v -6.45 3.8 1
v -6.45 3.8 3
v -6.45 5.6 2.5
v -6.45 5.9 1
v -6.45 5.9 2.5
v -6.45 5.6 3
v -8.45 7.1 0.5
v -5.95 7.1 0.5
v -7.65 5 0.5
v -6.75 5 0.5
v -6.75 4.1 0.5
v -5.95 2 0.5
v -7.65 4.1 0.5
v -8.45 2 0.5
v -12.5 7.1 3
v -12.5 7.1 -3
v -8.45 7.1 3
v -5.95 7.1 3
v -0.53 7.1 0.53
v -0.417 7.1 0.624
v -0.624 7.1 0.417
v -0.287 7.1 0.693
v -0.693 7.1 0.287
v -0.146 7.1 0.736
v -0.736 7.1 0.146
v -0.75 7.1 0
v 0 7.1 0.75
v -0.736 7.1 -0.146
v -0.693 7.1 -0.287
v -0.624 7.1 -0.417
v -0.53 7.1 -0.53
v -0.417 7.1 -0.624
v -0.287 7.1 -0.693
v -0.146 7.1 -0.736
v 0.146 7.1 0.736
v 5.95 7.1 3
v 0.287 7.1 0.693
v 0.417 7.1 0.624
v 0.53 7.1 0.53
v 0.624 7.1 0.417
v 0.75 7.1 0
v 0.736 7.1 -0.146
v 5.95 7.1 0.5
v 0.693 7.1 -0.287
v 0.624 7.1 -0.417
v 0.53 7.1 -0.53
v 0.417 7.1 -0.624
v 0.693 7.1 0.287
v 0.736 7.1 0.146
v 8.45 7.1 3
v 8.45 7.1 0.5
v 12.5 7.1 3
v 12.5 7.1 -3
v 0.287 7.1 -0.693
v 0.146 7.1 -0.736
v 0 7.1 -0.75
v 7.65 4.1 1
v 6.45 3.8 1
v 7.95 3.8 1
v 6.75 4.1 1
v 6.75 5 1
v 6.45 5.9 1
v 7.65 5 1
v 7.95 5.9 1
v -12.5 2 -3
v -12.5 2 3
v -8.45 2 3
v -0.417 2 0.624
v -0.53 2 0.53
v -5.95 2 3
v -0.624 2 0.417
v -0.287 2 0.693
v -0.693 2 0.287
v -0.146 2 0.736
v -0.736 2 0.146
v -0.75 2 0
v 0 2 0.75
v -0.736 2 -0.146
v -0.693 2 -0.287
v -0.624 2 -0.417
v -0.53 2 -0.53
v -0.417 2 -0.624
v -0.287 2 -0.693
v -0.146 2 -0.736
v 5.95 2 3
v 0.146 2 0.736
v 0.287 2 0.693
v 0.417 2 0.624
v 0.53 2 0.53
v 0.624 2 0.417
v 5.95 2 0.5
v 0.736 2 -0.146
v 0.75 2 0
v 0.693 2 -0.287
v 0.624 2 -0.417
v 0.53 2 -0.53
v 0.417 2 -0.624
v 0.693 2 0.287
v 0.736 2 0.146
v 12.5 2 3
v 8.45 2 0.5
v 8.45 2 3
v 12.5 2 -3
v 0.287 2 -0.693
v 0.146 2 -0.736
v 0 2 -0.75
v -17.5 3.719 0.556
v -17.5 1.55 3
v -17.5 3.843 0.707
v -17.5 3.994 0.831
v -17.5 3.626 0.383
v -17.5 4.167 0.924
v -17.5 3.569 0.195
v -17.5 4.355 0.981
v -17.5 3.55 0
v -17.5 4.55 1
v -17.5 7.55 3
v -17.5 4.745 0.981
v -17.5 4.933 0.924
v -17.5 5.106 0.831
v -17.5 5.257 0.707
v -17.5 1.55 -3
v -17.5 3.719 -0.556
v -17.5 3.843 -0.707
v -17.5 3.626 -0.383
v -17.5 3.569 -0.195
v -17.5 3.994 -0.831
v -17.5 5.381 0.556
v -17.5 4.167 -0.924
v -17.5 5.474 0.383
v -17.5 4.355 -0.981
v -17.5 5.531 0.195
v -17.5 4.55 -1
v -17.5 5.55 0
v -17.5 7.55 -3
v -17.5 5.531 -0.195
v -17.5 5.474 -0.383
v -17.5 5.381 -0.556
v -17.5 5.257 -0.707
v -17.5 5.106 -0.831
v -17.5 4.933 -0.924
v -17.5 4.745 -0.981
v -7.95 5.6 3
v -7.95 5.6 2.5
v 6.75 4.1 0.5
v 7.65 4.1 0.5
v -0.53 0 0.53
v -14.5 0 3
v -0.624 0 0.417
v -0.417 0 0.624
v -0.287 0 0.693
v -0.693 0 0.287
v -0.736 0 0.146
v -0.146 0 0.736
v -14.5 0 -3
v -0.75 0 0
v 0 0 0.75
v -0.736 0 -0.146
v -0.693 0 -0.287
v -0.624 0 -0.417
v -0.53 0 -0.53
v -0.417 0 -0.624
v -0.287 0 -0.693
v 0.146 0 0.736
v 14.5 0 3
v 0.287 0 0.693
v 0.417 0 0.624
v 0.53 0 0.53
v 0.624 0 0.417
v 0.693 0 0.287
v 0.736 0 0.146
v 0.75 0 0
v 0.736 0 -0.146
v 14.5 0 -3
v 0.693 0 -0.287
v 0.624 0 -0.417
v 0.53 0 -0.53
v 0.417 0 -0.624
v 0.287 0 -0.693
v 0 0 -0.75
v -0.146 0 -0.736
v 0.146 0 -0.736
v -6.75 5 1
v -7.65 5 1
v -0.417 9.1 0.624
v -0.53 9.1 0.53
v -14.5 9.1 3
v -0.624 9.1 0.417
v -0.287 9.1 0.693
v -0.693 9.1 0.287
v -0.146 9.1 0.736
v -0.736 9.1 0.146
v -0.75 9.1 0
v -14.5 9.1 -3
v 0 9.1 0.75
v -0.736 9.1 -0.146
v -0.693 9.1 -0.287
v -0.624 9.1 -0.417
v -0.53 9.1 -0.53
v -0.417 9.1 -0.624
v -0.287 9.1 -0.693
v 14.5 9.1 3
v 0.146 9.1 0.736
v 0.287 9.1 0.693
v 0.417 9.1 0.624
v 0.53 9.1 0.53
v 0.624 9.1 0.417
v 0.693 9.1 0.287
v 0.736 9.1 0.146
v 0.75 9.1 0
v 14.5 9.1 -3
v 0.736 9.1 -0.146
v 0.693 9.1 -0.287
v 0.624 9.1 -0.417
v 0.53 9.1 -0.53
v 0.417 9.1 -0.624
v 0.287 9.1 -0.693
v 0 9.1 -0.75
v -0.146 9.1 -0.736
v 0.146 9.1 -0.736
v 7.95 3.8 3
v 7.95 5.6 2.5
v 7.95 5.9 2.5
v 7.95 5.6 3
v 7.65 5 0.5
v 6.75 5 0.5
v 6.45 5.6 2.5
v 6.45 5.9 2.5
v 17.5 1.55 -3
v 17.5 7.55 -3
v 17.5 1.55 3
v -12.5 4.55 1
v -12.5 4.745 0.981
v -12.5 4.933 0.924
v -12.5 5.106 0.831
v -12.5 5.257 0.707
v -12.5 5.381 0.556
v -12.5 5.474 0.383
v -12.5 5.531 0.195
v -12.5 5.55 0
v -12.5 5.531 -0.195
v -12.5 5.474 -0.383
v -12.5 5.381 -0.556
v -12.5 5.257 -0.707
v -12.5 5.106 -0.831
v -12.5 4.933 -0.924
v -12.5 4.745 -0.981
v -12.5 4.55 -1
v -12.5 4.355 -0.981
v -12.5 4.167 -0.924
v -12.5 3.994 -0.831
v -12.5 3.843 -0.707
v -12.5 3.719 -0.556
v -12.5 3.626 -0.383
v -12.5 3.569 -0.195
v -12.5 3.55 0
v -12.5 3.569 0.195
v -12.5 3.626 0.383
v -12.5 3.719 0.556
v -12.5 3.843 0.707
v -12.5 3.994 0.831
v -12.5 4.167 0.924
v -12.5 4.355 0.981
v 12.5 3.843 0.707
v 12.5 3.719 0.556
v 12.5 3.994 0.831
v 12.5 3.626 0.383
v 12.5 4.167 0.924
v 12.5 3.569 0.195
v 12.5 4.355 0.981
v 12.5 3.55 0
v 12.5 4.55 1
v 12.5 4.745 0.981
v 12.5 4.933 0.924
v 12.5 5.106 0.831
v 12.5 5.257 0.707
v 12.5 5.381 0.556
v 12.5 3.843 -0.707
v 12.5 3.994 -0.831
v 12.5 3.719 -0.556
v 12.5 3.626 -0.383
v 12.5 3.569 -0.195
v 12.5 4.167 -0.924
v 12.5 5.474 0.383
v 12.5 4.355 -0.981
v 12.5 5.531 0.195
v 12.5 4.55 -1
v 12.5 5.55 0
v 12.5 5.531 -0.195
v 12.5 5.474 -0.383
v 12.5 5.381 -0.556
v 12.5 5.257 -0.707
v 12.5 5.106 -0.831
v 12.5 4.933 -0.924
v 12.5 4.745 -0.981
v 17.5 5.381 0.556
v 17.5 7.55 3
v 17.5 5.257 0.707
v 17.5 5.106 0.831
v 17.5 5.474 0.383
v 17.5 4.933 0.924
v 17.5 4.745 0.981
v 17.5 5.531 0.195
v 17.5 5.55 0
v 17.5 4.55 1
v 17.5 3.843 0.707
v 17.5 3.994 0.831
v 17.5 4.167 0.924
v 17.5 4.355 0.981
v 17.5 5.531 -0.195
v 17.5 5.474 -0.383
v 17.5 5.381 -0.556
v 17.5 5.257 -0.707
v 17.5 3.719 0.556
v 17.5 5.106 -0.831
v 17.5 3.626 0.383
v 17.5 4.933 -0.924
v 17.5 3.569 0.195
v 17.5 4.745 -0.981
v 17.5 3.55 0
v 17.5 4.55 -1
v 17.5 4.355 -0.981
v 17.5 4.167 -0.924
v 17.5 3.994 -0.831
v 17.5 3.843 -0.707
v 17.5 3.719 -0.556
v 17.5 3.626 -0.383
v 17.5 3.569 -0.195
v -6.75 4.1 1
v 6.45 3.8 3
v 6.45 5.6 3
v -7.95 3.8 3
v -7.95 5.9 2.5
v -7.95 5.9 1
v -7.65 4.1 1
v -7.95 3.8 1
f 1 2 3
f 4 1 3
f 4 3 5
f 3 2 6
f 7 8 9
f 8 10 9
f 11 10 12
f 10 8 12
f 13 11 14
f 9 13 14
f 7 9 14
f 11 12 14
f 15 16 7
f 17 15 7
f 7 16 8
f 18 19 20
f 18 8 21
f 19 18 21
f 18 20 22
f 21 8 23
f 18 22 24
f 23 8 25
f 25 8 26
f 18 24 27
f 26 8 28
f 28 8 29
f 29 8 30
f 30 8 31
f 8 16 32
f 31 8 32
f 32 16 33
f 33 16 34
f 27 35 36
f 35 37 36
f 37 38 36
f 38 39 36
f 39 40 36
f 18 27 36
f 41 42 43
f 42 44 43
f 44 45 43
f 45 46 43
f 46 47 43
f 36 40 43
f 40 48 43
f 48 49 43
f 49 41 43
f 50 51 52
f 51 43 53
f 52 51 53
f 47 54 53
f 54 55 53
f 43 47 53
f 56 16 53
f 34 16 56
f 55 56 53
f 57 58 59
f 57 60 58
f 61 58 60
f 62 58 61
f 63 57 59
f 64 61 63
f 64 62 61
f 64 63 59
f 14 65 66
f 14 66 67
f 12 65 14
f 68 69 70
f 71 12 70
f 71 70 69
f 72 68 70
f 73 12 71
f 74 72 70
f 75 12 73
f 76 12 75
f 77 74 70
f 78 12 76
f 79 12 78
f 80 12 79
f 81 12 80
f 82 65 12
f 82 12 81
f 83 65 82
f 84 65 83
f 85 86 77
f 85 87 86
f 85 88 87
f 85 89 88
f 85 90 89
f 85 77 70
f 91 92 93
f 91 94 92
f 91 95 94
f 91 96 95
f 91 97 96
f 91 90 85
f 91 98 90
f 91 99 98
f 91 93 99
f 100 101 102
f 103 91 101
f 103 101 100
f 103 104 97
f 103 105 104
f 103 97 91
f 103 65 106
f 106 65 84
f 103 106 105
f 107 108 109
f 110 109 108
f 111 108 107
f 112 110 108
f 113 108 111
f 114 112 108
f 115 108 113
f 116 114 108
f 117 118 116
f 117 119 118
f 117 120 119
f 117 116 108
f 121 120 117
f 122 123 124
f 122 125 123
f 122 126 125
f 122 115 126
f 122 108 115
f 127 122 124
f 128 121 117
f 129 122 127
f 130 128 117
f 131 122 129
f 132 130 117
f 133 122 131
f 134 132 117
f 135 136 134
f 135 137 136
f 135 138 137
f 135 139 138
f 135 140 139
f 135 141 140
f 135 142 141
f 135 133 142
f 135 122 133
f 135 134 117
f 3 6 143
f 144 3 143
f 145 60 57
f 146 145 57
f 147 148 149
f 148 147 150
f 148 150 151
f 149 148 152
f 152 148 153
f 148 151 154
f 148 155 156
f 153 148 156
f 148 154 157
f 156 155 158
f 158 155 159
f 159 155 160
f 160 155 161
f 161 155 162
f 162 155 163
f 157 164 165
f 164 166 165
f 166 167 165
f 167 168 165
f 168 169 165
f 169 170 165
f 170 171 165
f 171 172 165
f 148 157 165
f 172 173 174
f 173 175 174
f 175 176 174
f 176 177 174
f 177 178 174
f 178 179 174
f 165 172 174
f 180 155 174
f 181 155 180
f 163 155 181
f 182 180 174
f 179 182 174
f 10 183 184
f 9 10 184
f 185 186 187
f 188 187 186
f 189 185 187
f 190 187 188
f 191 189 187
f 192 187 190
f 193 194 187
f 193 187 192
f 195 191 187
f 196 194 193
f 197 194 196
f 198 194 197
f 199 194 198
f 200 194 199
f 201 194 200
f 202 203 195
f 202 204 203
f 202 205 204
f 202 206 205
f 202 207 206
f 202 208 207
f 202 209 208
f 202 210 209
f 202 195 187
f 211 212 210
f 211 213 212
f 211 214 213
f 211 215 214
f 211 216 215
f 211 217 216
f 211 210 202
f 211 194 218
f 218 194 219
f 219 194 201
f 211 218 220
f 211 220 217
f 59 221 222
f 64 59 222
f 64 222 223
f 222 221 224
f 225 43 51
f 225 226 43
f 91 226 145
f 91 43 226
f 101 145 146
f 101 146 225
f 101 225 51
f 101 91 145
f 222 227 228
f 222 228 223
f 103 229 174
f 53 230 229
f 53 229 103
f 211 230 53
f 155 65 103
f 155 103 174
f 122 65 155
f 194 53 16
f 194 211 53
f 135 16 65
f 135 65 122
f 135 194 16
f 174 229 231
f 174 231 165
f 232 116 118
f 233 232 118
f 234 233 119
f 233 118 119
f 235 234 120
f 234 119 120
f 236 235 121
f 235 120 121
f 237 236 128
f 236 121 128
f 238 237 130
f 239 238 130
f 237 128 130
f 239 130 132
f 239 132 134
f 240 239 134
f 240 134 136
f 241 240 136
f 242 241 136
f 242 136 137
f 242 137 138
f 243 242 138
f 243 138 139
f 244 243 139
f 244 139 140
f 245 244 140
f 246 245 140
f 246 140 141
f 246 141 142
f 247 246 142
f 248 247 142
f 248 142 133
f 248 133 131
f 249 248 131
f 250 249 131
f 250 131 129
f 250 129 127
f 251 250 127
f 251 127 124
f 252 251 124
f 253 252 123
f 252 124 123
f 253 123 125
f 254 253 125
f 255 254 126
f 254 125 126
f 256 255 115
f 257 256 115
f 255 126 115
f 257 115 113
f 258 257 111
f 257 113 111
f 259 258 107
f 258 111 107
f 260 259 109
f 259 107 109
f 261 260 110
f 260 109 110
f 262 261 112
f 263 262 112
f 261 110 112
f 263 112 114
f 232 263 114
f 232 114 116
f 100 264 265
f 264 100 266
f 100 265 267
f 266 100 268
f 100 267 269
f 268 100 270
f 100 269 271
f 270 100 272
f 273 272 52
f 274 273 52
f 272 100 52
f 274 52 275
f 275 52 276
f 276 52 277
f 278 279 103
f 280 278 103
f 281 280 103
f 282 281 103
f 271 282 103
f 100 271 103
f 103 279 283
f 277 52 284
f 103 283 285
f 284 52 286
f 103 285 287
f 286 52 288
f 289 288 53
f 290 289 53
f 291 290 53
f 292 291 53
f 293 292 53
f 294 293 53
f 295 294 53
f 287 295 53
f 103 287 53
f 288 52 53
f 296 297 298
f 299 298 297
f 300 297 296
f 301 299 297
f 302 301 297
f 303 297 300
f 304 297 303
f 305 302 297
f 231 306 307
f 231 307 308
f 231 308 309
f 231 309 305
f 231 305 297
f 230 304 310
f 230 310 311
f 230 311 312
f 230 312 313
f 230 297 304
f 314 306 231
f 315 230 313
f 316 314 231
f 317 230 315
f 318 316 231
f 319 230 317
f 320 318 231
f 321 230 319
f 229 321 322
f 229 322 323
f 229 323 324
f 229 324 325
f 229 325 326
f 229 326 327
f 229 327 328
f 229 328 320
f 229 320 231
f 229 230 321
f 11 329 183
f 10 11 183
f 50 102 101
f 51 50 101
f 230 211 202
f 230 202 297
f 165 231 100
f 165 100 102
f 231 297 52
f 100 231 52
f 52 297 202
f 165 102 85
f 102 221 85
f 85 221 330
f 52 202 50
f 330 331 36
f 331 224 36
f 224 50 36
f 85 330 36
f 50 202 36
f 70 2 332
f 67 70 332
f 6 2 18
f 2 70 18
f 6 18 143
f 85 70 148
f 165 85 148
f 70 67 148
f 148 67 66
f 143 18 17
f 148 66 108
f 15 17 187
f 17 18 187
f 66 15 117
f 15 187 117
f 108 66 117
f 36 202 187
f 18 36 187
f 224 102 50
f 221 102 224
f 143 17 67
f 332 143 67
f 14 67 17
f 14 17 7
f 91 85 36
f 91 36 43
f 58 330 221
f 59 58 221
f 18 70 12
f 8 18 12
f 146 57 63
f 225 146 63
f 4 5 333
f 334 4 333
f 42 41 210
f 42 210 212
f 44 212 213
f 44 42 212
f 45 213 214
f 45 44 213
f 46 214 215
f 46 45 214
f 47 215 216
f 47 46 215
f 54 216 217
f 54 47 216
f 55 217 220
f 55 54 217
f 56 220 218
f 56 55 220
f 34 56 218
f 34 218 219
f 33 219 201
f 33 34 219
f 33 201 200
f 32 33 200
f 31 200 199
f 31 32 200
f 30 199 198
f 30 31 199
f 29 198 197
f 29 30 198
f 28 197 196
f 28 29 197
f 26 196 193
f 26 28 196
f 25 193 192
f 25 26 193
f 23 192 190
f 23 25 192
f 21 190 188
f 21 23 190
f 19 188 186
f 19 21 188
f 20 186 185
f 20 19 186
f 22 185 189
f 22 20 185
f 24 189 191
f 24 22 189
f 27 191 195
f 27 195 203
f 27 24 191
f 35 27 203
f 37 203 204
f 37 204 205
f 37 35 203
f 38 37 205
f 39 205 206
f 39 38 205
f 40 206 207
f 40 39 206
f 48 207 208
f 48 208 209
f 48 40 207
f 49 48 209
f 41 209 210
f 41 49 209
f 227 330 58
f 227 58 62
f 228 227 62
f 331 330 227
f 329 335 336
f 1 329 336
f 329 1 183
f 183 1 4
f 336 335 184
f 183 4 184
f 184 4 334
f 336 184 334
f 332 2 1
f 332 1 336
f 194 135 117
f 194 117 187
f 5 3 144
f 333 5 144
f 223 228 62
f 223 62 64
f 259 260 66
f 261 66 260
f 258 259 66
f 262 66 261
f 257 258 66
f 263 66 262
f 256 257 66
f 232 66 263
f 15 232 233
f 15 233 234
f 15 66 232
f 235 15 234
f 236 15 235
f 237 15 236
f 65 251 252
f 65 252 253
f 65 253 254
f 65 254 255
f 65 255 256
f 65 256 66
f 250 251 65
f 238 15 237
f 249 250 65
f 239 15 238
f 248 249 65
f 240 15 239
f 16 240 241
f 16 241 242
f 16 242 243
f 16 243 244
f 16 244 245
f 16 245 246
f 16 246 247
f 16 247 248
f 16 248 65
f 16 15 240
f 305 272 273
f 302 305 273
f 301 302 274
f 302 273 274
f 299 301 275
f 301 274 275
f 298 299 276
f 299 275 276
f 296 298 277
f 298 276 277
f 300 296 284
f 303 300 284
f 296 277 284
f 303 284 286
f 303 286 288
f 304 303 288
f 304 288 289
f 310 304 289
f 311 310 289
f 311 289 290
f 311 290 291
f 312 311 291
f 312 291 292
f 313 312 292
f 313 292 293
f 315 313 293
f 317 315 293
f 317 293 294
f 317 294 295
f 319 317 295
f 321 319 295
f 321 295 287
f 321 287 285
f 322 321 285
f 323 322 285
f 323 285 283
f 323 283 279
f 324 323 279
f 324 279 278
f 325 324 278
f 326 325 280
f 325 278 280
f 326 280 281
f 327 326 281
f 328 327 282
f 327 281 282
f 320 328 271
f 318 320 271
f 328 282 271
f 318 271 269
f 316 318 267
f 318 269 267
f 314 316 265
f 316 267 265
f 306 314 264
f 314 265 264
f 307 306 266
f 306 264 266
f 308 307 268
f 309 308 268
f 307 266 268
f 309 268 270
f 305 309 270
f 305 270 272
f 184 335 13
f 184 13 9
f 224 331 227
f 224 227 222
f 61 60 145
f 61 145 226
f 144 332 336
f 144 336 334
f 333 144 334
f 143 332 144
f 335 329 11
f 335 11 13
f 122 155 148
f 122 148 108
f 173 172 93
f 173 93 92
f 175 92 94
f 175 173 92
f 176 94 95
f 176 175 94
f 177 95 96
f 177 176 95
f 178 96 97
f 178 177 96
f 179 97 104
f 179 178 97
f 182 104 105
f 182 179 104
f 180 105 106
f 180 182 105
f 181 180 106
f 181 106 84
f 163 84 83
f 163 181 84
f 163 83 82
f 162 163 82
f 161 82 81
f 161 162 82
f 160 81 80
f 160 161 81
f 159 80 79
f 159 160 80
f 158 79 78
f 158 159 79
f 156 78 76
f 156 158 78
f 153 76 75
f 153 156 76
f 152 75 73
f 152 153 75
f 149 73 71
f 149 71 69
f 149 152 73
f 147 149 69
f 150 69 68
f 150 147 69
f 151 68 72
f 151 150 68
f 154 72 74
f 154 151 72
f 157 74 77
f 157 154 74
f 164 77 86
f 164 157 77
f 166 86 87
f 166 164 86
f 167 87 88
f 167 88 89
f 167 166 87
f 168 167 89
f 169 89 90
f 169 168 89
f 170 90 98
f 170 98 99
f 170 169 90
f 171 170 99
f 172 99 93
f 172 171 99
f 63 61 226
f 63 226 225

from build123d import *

# Parameters (mm, degrees)
SKETCH1_W                  = 25
SKETCH1_H                  = 6
SKETCH1_R                  = 0.75
BASEFRAME_DEPTH            = 2
SKETCH2_W                  = 29
SKETCH2_H                  = 6
SKETCH2_R                  = 0.75
BOSS_EXTRUDE2_DEPTH        = 2
SKETCH2_3_W                = 2
SKETCH2_3_H                = 6
BOSS_EXTRUDE3_DEPTH        = 7.1
BOSS_EXTRUDE4_DEPTH        = 6
SKETCH4_R                  = 1
SHAFTHOLE_DEPTH            = 36
SLOTBLOCK_START            = -7.1
SKETCH5_W                  = 2.5
SKETCH5_H                  = 2.5
SLOTBLOCK_DEPTH            = 5.1
SKETCH6_W                  = 0.9
SKETCH6_H                  = 0.9
SKETCH6_W_2                = 1.5
SKETCH6_H_2                = 1.5
CLIPENTRANCE_DEPTH         = 2
SKETCH6_3_W                = 0.9
SKETCH6_3_H                = 0.9
CABLEEXIT_DEPTH            = 7
SKETCH7_W                  = 1.5
SKETCH7_H                  = 1.5
CLIPLOCKSLOT_DEPTH         = 0.6
SKETCH8_W                  = 1.5
SKETCH8_H                  = 0.3
CLIPLOCKCLEARANCECUT_DEPTH = 0.5


with BuildPart() as part:
    # Sketch1 → BaseFrame (new body)
    with BuildSketch(Plane(origin=(0, 0, 0), x_dir=(1, 0, 0), z_dir=(0, 1, 0))):
        Rectangle(SKETCH1_W, SKETCH1_H)
        Circle(SKETCH1_R, mode=Mode.SUBTRACT)
    extrude(amount=BASEFRAME_DEPTH)



with BuildPart() as body_2:
    # Sketch2 → Boss-Extrude2 (new body)
    with BuildSketch(Plane(origin=(0, 7.1, 0), x_dir=(1, 0, 0), z_dir=(0, 1, 0))):
        Rectangle(SKETCH2_W, SKETCH2_H)
        Circle(SKETCH2_R, mode=Mode.SUBTRACT)
    extrude(amount=BOSS_EXTRUDE2_DEPTH)


with BuildPart() as part_1:
    add(part.part)

    add(body_2.part)  # Boss-Extrude3 merges body 2
    # Sketch2<3> → Boss-Extrude3 (add)
    with BuildSketch(Plane(origin=(0, 7.1, 0), x_dir=(1, 0, 0), z_dir=(0, 1, 0))):
        with Locations((-13.5, 0)):
            Rectangle(SKETCH2_3_W, SKETCH2_3_H)
        with Locations((13.5, 0)):
            Rectangle(SKETCH2_3_W, SKETCH2_3_H)
    extrude(amount=-BOSS_EXTRUDE3_DEPTH)

    # Sketch3 → Boss-Extrude4 (add)
    with BuildSketch(Plane(origin=(0, 0, -3), x_dir=(-1, 0, 0), z_dir=(0, 0, -1))):
        Polygon((-14.5, 9.1), (-17.5, 7.55), (-17.5, 1.55), (-14.5, 0), align=None)
        Polygon((14.5, 0), (17.5, 1.55), (17.5, 7.55), (14.5, 9.1), align=None)
    extrude(amount=-BOSS_EXTRUDE4_DEPTH)

    # Sketch4 → ShaftHole (cut, through all)
    with BuildSketch(Plane.ZY.offset(17.5)):
        with Locations((0, 4.55)):
            Circle(SKETCH4_R)
    extrude(amount=-SHAFTHOLE_DEPTH, mode=Mode.SUBTRACT)

    # Sketch5 → SlotBlock (add)
    with BuildSketch(Plane(origin=(0, 9.1, 0), x_dir=(1, 0, 0), z_dir=(0, 1, 0)).offset(SLOTBLOCK_START)):
        with Locations((7.2, -1.75)):
            Rectangle(SKETCH5_W, SKETCH5_H)
    slotblock = extrude(amount=SLOTBLOCK_DEPTH)

    # Sketch6 → ClipEntrance (cut)
    with BuildSketch(Plane.XY.offset(3)):
        with Locations((7.2, 4.55)):
            Rectangle(SKETCH6_W, SKETCH6_H)
        with Locations((7.2, 4.55)):
            Rectangle(SKETCH6_W_2, SKETCH6_H_2)
        with Locations((7.2, 4.55)):
            Rectangle(SKETCH6_W, SKETCH6_H, mode=Mode.SUBTRACT)
    clipentrance = extrude(amount=-CLIPENTRANCE_DEPTH, mode=Mode.SUBTRACT)

    # Sketch6<3> → CableExit (cut, through all)
    with BuildSketch(Plane.XY.offset(3)):
        with Locations((7.2, 4.55)):
            Rectangle(SKETCH6_3_W, SKETCH6_3_H)
    cableexit = extrude(amount=-CABLEEXIT_DEPTH, mode=Mode.SUBTRACT)

    # Sketch7 → ClipLockSlot (cut)
    with BuildSketch(Plane.XZ.offset(-5.3)):
        with Locations((7.2, 1.75)):
            Rectangle(SKETCH7_W, SKETCH7_H)
    cliplockslot = extrude(amount=-CLIPLOCKSLOT_DEPTH, mode=Mode.SUBTRACT)

    # Sketch8 → ClipLockClearanceCut (cut)
    with BuildSketch(Plane.XY.offset(3)):
        with Locations((7.2, 5.45)):
            Rectangle(SKETCH8_W, SKETCH8_H)
    cliplockclearancecut = extrude(amount=-CLIPLOCKCLEARANCECUT_DEPTH, mode=Mode.SUBTRACT)

    # Mirror1: SlotBlock, ClipEntrance, CableExit, ClipLockSlot, ClipLockClearanceCut across plane
    add(slotblock.mirror(Plane(origin=(0, 0, 0), x_dir=(0, 0, 1), z_dir=(1, 0, 0))))
    add(clipentrance.mirror(Plane(origin=(0, 0, 0), x_dir=(0, 0, 1), z_dir=(1, 0, 0))), mode=Mode.SUBTRACT)
    add(cableexit.mirror(Plane(origin=(0, 0, 0), x_dir=(0, 0, 1), z_dir=(1, 0, 0))), mode=Mode.SUBTRACT)
    add(cliplockslot.mirror(Plane(origin=(0, 0, 0), x_dir=(0, 0, 1), z_dir=(1, 0, 0))), mode=Mode.SUBTRACT)
    add(cliplockclearancecut.mirror(Plane(origin=(0, 0, 0), x_dir=(0, 0, 1), z_dir=(1, 0, 0))), mode=Mode.SUBTRACT)


solid = part_1.part
